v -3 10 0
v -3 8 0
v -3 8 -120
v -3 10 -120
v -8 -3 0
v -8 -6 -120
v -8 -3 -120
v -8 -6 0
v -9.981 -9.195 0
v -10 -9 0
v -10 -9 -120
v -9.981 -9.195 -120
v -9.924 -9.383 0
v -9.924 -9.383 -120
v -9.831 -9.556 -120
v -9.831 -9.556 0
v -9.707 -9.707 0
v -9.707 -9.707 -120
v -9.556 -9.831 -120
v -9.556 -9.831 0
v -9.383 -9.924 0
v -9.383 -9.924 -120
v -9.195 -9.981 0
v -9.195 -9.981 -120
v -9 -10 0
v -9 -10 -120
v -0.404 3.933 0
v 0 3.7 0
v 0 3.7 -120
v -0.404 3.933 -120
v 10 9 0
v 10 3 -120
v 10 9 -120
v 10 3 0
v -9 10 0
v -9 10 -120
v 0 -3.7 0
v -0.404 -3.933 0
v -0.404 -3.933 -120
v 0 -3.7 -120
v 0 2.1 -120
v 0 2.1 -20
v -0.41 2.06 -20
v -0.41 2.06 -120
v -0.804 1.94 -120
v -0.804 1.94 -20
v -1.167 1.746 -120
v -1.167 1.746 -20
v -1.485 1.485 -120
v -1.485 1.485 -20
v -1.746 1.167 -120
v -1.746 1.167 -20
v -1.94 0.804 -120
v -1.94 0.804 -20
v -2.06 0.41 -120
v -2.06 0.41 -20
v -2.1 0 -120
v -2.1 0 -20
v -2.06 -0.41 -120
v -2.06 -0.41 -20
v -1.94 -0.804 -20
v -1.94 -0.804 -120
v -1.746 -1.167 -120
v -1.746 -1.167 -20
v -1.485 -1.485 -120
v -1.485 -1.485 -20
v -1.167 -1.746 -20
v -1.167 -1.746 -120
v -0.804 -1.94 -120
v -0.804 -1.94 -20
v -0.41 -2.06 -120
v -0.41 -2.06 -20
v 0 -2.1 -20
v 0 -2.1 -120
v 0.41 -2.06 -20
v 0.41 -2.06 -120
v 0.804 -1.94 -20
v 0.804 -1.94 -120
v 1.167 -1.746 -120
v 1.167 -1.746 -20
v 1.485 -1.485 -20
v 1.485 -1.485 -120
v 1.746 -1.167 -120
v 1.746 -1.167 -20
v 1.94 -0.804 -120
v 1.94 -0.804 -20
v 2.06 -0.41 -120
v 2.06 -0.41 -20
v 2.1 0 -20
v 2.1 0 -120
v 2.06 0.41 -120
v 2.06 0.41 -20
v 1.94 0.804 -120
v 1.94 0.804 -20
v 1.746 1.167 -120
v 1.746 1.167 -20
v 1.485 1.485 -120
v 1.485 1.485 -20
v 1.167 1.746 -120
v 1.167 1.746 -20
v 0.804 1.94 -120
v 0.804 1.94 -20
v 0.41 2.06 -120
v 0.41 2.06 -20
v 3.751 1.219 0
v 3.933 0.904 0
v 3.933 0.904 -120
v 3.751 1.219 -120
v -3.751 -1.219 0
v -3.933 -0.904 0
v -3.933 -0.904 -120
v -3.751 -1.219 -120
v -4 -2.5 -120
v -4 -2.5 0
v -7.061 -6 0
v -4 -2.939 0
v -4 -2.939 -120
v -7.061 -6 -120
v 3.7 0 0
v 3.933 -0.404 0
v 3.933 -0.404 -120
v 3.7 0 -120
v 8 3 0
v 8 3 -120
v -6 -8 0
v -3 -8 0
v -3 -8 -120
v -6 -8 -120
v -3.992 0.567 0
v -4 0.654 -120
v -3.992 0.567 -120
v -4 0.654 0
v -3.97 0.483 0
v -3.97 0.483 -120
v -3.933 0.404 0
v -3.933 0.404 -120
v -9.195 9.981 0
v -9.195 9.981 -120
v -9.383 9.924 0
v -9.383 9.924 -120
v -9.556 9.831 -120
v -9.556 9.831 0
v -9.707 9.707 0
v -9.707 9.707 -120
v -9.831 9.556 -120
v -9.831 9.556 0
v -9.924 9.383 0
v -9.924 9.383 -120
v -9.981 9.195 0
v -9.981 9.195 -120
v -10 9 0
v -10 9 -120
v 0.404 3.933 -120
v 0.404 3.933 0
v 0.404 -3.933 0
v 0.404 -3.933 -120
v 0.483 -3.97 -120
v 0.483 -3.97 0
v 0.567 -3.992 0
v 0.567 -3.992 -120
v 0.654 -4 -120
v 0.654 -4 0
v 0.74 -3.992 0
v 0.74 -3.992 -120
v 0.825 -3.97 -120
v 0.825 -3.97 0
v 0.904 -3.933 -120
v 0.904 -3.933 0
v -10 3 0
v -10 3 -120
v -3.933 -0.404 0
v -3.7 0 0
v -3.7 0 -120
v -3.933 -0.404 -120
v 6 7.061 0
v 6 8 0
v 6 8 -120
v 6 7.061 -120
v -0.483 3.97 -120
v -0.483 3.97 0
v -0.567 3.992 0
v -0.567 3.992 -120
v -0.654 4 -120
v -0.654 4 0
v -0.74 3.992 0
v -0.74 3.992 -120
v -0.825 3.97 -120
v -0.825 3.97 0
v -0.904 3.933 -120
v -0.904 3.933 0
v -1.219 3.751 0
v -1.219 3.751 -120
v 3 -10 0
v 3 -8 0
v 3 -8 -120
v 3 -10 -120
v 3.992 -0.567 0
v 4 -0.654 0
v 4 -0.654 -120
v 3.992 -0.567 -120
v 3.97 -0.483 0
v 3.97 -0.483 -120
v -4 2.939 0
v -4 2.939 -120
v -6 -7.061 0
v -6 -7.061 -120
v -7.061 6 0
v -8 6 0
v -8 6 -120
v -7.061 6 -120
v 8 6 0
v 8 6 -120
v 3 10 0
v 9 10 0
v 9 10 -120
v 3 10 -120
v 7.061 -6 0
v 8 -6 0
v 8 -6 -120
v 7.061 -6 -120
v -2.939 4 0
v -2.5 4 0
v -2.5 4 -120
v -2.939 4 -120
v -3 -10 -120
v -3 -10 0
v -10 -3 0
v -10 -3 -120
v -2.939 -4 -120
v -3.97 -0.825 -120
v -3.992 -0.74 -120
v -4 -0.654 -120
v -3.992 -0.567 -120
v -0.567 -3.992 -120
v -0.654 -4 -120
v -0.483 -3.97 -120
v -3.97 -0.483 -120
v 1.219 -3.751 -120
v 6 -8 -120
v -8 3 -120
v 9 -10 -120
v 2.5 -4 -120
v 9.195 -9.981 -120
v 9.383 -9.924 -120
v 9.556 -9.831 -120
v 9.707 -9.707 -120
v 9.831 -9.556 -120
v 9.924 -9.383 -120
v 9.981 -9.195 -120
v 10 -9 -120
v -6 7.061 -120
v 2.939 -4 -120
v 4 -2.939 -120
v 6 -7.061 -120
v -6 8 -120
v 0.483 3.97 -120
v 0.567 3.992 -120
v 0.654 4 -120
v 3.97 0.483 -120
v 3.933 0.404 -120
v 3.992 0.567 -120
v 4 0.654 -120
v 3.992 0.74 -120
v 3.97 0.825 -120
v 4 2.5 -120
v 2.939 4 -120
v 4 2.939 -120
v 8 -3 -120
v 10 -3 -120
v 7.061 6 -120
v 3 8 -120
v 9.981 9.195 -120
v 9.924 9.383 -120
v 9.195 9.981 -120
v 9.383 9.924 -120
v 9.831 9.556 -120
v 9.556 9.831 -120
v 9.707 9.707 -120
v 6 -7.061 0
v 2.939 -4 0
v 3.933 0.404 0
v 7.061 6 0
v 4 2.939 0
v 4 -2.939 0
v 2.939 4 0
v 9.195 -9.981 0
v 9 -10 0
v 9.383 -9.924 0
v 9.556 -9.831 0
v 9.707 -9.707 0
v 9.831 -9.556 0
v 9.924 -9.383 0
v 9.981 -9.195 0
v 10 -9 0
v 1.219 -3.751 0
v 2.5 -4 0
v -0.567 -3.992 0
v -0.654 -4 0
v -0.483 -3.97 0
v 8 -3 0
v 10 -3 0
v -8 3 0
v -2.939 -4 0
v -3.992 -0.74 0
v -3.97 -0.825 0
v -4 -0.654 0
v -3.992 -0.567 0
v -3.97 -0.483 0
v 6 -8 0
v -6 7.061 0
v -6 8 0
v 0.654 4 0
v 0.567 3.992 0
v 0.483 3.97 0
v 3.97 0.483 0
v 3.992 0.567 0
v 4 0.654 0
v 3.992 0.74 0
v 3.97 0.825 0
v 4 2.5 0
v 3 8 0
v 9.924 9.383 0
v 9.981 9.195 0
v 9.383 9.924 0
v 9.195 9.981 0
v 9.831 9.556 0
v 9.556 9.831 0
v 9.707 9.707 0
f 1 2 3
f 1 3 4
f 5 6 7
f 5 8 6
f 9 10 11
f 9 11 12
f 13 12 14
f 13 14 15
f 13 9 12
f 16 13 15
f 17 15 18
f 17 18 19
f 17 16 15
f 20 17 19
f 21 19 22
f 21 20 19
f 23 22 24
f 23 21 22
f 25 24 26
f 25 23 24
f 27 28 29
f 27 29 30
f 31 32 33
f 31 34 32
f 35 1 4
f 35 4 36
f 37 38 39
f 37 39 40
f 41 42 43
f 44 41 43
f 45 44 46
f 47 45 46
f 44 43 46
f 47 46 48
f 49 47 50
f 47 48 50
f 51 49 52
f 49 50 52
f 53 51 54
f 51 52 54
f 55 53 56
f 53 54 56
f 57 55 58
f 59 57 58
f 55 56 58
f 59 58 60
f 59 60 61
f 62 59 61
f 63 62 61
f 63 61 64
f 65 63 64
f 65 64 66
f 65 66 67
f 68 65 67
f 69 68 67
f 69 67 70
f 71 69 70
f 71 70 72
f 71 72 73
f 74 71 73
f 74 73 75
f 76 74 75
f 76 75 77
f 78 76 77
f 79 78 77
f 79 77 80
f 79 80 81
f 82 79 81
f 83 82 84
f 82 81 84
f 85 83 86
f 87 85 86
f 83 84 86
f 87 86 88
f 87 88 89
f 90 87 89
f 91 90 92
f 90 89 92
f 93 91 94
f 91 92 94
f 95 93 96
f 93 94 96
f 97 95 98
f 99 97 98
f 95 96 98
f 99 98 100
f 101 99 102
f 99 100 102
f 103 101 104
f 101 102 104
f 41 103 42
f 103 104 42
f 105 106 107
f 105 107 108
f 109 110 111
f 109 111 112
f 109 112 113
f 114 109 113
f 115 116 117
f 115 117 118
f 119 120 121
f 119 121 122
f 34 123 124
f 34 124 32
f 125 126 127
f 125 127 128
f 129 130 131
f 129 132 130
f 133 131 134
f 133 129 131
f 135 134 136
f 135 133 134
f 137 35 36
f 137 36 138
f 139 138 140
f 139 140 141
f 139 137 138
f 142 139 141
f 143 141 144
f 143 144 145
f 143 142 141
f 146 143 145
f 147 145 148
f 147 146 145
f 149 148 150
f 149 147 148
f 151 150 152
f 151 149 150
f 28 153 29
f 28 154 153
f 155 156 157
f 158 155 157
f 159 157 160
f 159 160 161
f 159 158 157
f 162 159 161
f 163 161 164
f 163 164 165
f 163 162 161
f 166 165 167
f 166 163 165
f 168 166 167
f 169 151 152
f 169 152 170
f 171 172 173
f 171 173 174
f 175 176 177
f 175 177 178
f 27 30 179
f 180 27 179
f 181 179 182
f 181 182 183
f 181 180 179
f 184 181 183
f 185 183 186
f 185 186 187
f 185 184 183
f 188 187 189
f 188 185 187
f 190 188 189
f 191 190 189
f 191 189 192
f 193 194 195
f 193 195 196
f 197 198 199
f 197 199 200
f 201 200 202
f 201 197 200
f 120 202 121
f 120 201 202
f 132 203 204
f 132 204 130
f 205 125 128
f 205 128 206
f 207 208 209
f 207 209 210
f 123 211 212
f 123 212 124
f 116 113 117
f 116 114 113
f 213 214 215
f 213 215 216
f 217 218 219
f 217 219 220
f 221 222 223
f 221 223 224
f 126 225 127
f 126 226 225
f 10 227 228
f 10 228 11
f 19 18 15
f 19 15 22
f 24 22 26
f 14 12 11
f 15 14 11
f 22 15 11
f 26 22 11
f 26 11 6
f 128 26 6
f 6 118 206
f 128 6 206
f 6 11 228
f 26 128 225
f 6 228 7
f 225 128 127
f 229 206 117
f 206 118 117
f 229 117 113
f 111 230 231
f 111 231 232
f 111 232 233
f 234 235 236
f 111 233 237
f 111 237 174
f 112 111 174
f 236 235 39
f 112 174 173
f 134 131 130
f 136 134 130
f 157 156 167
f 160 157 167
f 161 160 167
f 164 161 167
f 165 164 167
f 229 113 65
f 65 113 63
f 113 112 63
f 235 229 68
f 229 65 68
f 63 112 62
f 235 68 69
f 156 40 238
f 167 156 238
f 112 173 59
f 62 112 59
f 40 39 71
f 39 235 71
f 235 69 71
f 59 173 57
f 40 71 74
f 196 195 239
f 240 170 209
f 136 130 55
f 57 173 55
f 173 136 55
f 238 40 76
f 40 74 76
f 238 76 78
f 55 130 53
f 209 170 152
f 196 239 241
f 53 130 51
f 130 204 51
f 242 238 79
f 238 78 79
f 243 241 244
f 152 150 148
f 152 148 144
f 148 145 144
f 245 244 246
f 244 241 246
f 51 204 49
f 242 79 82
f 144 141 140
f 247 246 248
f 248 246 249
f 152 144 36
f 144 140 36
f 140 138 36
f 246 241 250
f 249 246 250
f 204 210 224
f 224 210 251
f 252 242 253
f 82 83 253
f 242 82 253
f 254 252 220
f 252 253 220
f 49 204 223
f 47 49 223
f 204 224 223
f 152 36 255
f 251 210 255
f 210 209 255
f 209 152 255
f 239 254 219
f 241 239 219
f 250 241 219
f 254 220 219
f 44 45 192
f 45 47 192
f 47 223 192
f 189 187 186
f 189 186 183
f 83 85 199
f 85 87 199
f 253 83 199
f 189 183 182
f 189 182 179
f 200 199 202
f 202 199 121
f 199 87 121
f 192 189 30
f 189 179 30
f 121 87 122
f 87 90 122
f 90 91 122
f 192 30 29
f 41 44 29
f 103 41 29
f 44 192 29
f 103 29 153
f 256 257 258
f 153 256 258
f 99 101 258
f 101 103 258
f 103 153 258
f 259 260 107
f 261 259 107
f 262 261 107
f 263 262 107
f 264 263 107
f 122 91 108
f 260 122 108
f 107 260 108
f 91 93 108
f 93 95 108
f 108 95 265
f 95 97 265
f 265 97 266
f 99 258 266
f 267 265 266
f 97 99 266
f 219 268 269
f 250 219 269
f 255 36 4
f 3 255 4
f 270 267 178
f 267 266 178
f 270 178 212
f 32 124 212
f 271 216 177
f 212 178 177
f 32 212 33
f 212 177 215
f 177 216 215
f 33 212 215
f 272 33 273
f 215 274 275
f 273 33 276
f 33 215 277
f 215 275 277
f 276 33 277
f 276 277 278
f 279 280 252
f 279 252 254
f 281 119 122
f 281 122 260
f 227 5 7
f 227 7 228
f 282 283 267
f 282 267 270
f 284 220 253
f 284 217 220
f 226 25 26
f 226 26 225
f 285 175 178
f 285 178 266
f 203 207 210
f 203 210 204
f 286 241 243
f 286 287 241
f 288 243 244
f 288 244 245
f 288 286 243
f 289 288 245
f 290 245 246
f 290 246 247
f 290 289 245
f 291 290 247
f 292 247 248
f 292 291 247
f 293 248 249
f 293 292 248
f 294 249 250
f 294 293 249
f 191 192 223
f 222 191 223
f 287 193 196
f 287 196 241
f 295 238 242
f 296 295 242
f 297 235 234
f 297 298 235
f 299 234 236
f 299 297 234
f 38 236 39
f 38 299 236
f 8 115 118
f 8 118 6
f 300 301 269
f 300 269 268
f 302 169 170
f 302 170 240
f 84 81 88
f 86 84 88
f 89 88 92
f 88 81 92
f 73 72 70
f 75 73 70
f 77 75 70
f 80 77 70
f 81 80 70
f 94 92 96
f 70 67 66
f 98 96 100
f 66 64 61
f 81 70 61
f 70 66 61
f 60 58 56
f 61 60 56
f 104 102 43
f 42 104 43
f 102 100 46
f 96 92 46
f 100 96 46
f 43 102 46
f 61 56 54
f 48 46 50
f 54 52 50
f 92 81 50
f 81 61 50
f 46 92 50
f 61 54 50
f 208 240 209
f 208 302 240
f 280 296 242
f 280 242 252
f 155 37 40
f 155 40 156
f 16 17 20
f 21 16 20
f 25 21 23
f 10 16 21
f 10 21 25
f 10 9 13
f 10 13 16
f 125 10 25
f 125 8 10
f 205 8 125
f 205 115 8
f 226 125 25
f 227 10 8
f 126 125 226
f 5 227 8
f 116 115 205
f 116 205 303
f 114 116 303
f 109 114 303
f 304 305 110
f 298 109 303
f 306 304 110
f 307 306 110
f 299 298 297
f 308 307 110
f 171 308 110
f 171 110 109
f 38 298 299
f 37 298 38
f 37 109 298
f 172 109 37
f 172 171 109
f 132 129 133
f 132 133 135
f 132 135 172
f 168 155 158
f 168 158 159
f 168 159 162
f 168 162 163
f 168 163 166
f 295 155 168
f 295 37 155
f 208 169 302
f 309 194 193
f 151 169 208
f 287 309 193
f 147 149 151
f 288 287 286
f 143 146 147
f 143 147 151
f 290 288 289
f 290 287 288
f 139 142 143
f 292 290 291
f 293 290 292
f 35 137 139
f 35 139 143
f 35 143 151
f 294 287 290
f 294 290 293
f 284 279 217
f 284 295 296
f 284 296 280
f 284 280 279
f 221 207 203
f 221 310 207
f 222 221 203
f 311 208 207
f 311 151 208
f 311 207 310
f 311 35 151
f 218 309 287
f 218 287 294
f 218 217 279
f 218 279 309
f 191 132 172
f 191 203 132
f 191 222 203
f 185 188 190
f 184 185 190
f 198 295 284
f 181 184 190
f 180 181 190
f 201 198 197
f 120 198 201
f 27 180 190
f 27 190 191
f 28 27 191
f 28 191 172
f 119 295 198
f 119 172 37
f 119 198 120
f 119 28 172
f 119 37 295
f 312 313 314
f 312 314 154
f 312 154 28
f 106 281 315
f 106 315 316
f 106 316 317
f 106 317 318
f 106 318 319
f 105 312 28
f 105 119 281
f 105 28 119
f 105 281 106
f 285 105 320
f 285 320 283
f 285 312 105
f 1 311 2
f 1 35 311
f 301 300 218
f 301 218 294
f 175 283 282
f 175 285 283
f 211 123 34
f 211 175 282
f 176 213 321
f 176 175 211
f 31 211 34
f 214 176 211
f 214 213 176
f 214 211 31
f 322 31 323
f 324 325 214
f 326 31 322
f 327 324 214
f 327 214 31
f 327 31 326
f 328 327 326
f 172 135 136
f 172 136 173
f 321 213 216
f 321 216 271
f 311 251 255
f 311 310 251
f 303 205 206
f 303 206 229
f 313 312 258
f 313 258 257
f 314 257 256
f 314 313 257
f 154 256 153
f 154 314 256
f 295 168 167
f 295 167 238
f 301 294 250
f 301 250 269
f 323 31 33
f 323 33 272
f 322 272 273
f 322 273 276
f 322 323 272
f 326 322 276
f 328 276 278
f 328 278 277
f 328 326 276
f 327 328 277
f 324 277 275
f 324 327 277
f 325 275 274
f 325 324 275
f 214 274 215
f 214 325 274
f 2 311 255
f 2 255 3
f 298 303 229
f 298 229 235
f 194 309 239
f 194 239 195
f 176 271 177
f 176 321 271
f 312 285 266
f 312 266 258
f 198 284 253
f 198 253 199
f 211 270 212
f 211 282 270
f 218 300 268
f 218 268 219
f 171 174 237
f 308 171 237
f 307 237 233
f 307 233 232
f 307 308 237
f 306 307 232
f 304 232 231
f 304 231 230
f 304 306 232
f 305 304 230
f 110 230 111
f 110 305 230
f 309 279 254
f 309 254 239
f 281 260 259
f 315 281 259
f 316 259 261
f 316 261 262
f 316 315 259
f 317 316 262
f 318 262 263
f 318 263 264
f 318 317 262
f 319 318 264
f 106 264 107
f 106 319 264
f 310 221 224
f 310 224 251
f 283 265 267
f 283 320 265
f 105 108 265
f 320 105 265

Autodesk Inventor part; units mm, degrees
sketch "Sketch_75" plane through (0, 0, 0) normal (0, 0, 1) x (1, 0, 0)
  line L0 (-10, -3) -> (-10, -9)
  arc A0 (-10, -9) -> (-9, -10) centre (-9, -9) ccw
  line L1 (-9, -10) -> (-3, -10)
  line L2 (-3, -10) -> (-3, -8)
  line L3 (-3, -8) -> (-6, -8)
  line L4 (-6, -8) -> (-6, -7.0607)
  line L5 (-6, -7.0607) -> (-2.9393, -4)
  line L6 (-2.9393, -4) -> (-0.6536, -4)
  arc A1 (-0.6536, -4) -> (-0.4036, -3.933) centre (-0.6536, -3.5) ccw
  line L7 (-0.4036, -3.933) -> (0, -3.7)
  line L8 (0, -3.7) -> (0.4036, -3.933)
  arc A2 (0.4036, -3.933) -> (0.9036, -3.933) centre (0.6536, -3.5) ccw
  line L9 (0.9036, -3.933) -> (1.2189, -3.751)
  line L10 (1.2189, -3.751) -> (2.5, -4)
  line L11 (2.5, -4) -> (2.9393, -4)
  line L12 (2.9393, -4) -> (6, -7.0607)
  line L13 (6, -7.0607) -> (6, -8)
  line L14 (6, -8) -> (3, -8)
  line L15 (3, -8) -> (3, -10)
  line L16 (3, -10) -> (9, -10)
  arc A3 (9, -10) -> (10, -9) centre (9, -9) ccw
  line L17 (10, -9) -> (10, -3)
  line L18 (10, -3) -> (8, -3)
  line L19 (8, -3) -> (8, -6)
  line L20 (8, -6) -> (7.0607, -6)
  line L21 (7.0607, -6) -> (4, -2.9393)
  line L22 (4, -2.9393) -> (4, -0.6536)
  arc A4 (4, -0.6536) -> (3.933, -0.4036) centre (3.5, -0.6536) ccw
  line L23 (3.933, -0.4036) -> (3.7, 0)
  line L24 (3.7, 0) -> (3.933, 0.4036)
  arc A5 (3.933, 0.4036) -> (3.933, 0.9036) centre (3.5, 0.6536) ccw
  line L25 (3.933, 0.9036) -> (3.751, 1.2189)
  line L26 (3.751, 1.2189) -> (4, 2.5)
  line L27 (4, 2.5) -> (4, 2.9393)
  line L28 (4, 2.9393) -> (7.0607, 6)
  line L29 (7.0607, 6) -> (8, 6)
  line L30 (8, 6) -> (8, 3)
  line L31 (8, 3) -> (10, 3)
  line L32 (10, 3) -> (10, 9)
  arc A6 (10, 9) -> (9, 10) centre (9, 9) ccw
  line L33 (9, 10) -> (3, 10)
  line L34 (3, 10) -> (3, 8)
  line L35 (3, 8) -> (6, 8)
  line L36 (6, 8) -> (6, 7.0607)
  line L37 (6, 7.0607) -> (2.9393, 4)
  line L38 (2.9393, 4) -> (0.6536, 4)
  arc A7 (0.6536, 4) -> (0.4036, 3.933) centre (0.6536, 3.5) ccw
  line L39 (0.4036, 3.933) -> (0, 3.7)
  line L40 (0, 3.7) -> (-0.4036, 3.933)
  arc A8 (-0.4036, 3.933) -> (-0.9036, 3.933) centre (-0.6536, 3.5) ccw
  line L41 (-0.9036, 3.933) -> (-1.2189, 3.751)
  line L42 (-1.2189, 3.751) -> (-2.5, 4)
  line L43 (-2.5, 4) -> (-2.9393, 4)
  line L44 (-2.9393, 4) -> (-6, 7.0607)
  line L45 (-6, 7.0607) -> (-6, 8)
  line L46 (-6, 8) -> (-3, 8)
  line L47 (-3, 8) -> (-3, 10)
  line L48 (-3, 10) -> (-9, 10)
  arc A9 (-9, 10) -> (-10, 9) centre (-9, 9) ccw
  line L49 (-10, 9) -> (-10, 3)
  line L50 (-10, 3) -> (-8, 3)
  line L51 (-8, 3) -> (-8, 6)
  line L52 (-8, 6) -> (-7.0607, 6)
  line L53 (-7.0607, 6) -> (-4, 2.9393)
  line L54 (-4, 2.9393) -> (-4, 0.6536)
  arc A10 (-4, 0.6536) -> (-3.933, 0.4036) centre (-3.5, 0.6536) ccw
  line L55 (-3.933, 0.4036) -> (-3.7, 0)
  line L56 (-3.7, 0) -> (-3.933, -0.4036)
  arc A11 (-3.933, -0.4036) -> (-3.933, -0.9036) centre (-3.5, -0.6536) ccw
  line L57 (-3.933, -0.9036) -> (-3.751, -1.2189)
  line L58 (-3.751, -1.2189) -> (-4, -2.5)
  line L59 (-4, -2.5) -> (-4, -2.9393)
  line L60 (-4, -2.9393) -> (-7.0607, -6)
  line L61 (-7.0607, -6) -> (-8, -6)
  line L62 (-8, -6) -> (-8, -3)
  line L63 (-8, -3) -> (-10, -3)
extrude "Extrusion1" add sketch "Sketch_75" against normal blind 120
sketch "Sketch2" plane through (0, 0, -120) normal (0, 0, -1) x (-1, 0, 0)
  point P0 (0, 0)
hole "Hole1" at (0, 0, -120) direction (0, 0, 1) diameter 4.2 depth 100
ref_plane "C1_XY" through (0, 0, 0) normal (0, 0, 1) x (1, 0, 0)
ref_plane "C1_YZ" through (0, 0, 0) normal (1, 0, 0) x (0, 1, 0)
ref_plane "C1_ZX" through (0, 0, 0) normal (0, 1, 0) x (0, 0, 1)
properties part number "NFS5-2020-100" material "アルミニウム 6061"
